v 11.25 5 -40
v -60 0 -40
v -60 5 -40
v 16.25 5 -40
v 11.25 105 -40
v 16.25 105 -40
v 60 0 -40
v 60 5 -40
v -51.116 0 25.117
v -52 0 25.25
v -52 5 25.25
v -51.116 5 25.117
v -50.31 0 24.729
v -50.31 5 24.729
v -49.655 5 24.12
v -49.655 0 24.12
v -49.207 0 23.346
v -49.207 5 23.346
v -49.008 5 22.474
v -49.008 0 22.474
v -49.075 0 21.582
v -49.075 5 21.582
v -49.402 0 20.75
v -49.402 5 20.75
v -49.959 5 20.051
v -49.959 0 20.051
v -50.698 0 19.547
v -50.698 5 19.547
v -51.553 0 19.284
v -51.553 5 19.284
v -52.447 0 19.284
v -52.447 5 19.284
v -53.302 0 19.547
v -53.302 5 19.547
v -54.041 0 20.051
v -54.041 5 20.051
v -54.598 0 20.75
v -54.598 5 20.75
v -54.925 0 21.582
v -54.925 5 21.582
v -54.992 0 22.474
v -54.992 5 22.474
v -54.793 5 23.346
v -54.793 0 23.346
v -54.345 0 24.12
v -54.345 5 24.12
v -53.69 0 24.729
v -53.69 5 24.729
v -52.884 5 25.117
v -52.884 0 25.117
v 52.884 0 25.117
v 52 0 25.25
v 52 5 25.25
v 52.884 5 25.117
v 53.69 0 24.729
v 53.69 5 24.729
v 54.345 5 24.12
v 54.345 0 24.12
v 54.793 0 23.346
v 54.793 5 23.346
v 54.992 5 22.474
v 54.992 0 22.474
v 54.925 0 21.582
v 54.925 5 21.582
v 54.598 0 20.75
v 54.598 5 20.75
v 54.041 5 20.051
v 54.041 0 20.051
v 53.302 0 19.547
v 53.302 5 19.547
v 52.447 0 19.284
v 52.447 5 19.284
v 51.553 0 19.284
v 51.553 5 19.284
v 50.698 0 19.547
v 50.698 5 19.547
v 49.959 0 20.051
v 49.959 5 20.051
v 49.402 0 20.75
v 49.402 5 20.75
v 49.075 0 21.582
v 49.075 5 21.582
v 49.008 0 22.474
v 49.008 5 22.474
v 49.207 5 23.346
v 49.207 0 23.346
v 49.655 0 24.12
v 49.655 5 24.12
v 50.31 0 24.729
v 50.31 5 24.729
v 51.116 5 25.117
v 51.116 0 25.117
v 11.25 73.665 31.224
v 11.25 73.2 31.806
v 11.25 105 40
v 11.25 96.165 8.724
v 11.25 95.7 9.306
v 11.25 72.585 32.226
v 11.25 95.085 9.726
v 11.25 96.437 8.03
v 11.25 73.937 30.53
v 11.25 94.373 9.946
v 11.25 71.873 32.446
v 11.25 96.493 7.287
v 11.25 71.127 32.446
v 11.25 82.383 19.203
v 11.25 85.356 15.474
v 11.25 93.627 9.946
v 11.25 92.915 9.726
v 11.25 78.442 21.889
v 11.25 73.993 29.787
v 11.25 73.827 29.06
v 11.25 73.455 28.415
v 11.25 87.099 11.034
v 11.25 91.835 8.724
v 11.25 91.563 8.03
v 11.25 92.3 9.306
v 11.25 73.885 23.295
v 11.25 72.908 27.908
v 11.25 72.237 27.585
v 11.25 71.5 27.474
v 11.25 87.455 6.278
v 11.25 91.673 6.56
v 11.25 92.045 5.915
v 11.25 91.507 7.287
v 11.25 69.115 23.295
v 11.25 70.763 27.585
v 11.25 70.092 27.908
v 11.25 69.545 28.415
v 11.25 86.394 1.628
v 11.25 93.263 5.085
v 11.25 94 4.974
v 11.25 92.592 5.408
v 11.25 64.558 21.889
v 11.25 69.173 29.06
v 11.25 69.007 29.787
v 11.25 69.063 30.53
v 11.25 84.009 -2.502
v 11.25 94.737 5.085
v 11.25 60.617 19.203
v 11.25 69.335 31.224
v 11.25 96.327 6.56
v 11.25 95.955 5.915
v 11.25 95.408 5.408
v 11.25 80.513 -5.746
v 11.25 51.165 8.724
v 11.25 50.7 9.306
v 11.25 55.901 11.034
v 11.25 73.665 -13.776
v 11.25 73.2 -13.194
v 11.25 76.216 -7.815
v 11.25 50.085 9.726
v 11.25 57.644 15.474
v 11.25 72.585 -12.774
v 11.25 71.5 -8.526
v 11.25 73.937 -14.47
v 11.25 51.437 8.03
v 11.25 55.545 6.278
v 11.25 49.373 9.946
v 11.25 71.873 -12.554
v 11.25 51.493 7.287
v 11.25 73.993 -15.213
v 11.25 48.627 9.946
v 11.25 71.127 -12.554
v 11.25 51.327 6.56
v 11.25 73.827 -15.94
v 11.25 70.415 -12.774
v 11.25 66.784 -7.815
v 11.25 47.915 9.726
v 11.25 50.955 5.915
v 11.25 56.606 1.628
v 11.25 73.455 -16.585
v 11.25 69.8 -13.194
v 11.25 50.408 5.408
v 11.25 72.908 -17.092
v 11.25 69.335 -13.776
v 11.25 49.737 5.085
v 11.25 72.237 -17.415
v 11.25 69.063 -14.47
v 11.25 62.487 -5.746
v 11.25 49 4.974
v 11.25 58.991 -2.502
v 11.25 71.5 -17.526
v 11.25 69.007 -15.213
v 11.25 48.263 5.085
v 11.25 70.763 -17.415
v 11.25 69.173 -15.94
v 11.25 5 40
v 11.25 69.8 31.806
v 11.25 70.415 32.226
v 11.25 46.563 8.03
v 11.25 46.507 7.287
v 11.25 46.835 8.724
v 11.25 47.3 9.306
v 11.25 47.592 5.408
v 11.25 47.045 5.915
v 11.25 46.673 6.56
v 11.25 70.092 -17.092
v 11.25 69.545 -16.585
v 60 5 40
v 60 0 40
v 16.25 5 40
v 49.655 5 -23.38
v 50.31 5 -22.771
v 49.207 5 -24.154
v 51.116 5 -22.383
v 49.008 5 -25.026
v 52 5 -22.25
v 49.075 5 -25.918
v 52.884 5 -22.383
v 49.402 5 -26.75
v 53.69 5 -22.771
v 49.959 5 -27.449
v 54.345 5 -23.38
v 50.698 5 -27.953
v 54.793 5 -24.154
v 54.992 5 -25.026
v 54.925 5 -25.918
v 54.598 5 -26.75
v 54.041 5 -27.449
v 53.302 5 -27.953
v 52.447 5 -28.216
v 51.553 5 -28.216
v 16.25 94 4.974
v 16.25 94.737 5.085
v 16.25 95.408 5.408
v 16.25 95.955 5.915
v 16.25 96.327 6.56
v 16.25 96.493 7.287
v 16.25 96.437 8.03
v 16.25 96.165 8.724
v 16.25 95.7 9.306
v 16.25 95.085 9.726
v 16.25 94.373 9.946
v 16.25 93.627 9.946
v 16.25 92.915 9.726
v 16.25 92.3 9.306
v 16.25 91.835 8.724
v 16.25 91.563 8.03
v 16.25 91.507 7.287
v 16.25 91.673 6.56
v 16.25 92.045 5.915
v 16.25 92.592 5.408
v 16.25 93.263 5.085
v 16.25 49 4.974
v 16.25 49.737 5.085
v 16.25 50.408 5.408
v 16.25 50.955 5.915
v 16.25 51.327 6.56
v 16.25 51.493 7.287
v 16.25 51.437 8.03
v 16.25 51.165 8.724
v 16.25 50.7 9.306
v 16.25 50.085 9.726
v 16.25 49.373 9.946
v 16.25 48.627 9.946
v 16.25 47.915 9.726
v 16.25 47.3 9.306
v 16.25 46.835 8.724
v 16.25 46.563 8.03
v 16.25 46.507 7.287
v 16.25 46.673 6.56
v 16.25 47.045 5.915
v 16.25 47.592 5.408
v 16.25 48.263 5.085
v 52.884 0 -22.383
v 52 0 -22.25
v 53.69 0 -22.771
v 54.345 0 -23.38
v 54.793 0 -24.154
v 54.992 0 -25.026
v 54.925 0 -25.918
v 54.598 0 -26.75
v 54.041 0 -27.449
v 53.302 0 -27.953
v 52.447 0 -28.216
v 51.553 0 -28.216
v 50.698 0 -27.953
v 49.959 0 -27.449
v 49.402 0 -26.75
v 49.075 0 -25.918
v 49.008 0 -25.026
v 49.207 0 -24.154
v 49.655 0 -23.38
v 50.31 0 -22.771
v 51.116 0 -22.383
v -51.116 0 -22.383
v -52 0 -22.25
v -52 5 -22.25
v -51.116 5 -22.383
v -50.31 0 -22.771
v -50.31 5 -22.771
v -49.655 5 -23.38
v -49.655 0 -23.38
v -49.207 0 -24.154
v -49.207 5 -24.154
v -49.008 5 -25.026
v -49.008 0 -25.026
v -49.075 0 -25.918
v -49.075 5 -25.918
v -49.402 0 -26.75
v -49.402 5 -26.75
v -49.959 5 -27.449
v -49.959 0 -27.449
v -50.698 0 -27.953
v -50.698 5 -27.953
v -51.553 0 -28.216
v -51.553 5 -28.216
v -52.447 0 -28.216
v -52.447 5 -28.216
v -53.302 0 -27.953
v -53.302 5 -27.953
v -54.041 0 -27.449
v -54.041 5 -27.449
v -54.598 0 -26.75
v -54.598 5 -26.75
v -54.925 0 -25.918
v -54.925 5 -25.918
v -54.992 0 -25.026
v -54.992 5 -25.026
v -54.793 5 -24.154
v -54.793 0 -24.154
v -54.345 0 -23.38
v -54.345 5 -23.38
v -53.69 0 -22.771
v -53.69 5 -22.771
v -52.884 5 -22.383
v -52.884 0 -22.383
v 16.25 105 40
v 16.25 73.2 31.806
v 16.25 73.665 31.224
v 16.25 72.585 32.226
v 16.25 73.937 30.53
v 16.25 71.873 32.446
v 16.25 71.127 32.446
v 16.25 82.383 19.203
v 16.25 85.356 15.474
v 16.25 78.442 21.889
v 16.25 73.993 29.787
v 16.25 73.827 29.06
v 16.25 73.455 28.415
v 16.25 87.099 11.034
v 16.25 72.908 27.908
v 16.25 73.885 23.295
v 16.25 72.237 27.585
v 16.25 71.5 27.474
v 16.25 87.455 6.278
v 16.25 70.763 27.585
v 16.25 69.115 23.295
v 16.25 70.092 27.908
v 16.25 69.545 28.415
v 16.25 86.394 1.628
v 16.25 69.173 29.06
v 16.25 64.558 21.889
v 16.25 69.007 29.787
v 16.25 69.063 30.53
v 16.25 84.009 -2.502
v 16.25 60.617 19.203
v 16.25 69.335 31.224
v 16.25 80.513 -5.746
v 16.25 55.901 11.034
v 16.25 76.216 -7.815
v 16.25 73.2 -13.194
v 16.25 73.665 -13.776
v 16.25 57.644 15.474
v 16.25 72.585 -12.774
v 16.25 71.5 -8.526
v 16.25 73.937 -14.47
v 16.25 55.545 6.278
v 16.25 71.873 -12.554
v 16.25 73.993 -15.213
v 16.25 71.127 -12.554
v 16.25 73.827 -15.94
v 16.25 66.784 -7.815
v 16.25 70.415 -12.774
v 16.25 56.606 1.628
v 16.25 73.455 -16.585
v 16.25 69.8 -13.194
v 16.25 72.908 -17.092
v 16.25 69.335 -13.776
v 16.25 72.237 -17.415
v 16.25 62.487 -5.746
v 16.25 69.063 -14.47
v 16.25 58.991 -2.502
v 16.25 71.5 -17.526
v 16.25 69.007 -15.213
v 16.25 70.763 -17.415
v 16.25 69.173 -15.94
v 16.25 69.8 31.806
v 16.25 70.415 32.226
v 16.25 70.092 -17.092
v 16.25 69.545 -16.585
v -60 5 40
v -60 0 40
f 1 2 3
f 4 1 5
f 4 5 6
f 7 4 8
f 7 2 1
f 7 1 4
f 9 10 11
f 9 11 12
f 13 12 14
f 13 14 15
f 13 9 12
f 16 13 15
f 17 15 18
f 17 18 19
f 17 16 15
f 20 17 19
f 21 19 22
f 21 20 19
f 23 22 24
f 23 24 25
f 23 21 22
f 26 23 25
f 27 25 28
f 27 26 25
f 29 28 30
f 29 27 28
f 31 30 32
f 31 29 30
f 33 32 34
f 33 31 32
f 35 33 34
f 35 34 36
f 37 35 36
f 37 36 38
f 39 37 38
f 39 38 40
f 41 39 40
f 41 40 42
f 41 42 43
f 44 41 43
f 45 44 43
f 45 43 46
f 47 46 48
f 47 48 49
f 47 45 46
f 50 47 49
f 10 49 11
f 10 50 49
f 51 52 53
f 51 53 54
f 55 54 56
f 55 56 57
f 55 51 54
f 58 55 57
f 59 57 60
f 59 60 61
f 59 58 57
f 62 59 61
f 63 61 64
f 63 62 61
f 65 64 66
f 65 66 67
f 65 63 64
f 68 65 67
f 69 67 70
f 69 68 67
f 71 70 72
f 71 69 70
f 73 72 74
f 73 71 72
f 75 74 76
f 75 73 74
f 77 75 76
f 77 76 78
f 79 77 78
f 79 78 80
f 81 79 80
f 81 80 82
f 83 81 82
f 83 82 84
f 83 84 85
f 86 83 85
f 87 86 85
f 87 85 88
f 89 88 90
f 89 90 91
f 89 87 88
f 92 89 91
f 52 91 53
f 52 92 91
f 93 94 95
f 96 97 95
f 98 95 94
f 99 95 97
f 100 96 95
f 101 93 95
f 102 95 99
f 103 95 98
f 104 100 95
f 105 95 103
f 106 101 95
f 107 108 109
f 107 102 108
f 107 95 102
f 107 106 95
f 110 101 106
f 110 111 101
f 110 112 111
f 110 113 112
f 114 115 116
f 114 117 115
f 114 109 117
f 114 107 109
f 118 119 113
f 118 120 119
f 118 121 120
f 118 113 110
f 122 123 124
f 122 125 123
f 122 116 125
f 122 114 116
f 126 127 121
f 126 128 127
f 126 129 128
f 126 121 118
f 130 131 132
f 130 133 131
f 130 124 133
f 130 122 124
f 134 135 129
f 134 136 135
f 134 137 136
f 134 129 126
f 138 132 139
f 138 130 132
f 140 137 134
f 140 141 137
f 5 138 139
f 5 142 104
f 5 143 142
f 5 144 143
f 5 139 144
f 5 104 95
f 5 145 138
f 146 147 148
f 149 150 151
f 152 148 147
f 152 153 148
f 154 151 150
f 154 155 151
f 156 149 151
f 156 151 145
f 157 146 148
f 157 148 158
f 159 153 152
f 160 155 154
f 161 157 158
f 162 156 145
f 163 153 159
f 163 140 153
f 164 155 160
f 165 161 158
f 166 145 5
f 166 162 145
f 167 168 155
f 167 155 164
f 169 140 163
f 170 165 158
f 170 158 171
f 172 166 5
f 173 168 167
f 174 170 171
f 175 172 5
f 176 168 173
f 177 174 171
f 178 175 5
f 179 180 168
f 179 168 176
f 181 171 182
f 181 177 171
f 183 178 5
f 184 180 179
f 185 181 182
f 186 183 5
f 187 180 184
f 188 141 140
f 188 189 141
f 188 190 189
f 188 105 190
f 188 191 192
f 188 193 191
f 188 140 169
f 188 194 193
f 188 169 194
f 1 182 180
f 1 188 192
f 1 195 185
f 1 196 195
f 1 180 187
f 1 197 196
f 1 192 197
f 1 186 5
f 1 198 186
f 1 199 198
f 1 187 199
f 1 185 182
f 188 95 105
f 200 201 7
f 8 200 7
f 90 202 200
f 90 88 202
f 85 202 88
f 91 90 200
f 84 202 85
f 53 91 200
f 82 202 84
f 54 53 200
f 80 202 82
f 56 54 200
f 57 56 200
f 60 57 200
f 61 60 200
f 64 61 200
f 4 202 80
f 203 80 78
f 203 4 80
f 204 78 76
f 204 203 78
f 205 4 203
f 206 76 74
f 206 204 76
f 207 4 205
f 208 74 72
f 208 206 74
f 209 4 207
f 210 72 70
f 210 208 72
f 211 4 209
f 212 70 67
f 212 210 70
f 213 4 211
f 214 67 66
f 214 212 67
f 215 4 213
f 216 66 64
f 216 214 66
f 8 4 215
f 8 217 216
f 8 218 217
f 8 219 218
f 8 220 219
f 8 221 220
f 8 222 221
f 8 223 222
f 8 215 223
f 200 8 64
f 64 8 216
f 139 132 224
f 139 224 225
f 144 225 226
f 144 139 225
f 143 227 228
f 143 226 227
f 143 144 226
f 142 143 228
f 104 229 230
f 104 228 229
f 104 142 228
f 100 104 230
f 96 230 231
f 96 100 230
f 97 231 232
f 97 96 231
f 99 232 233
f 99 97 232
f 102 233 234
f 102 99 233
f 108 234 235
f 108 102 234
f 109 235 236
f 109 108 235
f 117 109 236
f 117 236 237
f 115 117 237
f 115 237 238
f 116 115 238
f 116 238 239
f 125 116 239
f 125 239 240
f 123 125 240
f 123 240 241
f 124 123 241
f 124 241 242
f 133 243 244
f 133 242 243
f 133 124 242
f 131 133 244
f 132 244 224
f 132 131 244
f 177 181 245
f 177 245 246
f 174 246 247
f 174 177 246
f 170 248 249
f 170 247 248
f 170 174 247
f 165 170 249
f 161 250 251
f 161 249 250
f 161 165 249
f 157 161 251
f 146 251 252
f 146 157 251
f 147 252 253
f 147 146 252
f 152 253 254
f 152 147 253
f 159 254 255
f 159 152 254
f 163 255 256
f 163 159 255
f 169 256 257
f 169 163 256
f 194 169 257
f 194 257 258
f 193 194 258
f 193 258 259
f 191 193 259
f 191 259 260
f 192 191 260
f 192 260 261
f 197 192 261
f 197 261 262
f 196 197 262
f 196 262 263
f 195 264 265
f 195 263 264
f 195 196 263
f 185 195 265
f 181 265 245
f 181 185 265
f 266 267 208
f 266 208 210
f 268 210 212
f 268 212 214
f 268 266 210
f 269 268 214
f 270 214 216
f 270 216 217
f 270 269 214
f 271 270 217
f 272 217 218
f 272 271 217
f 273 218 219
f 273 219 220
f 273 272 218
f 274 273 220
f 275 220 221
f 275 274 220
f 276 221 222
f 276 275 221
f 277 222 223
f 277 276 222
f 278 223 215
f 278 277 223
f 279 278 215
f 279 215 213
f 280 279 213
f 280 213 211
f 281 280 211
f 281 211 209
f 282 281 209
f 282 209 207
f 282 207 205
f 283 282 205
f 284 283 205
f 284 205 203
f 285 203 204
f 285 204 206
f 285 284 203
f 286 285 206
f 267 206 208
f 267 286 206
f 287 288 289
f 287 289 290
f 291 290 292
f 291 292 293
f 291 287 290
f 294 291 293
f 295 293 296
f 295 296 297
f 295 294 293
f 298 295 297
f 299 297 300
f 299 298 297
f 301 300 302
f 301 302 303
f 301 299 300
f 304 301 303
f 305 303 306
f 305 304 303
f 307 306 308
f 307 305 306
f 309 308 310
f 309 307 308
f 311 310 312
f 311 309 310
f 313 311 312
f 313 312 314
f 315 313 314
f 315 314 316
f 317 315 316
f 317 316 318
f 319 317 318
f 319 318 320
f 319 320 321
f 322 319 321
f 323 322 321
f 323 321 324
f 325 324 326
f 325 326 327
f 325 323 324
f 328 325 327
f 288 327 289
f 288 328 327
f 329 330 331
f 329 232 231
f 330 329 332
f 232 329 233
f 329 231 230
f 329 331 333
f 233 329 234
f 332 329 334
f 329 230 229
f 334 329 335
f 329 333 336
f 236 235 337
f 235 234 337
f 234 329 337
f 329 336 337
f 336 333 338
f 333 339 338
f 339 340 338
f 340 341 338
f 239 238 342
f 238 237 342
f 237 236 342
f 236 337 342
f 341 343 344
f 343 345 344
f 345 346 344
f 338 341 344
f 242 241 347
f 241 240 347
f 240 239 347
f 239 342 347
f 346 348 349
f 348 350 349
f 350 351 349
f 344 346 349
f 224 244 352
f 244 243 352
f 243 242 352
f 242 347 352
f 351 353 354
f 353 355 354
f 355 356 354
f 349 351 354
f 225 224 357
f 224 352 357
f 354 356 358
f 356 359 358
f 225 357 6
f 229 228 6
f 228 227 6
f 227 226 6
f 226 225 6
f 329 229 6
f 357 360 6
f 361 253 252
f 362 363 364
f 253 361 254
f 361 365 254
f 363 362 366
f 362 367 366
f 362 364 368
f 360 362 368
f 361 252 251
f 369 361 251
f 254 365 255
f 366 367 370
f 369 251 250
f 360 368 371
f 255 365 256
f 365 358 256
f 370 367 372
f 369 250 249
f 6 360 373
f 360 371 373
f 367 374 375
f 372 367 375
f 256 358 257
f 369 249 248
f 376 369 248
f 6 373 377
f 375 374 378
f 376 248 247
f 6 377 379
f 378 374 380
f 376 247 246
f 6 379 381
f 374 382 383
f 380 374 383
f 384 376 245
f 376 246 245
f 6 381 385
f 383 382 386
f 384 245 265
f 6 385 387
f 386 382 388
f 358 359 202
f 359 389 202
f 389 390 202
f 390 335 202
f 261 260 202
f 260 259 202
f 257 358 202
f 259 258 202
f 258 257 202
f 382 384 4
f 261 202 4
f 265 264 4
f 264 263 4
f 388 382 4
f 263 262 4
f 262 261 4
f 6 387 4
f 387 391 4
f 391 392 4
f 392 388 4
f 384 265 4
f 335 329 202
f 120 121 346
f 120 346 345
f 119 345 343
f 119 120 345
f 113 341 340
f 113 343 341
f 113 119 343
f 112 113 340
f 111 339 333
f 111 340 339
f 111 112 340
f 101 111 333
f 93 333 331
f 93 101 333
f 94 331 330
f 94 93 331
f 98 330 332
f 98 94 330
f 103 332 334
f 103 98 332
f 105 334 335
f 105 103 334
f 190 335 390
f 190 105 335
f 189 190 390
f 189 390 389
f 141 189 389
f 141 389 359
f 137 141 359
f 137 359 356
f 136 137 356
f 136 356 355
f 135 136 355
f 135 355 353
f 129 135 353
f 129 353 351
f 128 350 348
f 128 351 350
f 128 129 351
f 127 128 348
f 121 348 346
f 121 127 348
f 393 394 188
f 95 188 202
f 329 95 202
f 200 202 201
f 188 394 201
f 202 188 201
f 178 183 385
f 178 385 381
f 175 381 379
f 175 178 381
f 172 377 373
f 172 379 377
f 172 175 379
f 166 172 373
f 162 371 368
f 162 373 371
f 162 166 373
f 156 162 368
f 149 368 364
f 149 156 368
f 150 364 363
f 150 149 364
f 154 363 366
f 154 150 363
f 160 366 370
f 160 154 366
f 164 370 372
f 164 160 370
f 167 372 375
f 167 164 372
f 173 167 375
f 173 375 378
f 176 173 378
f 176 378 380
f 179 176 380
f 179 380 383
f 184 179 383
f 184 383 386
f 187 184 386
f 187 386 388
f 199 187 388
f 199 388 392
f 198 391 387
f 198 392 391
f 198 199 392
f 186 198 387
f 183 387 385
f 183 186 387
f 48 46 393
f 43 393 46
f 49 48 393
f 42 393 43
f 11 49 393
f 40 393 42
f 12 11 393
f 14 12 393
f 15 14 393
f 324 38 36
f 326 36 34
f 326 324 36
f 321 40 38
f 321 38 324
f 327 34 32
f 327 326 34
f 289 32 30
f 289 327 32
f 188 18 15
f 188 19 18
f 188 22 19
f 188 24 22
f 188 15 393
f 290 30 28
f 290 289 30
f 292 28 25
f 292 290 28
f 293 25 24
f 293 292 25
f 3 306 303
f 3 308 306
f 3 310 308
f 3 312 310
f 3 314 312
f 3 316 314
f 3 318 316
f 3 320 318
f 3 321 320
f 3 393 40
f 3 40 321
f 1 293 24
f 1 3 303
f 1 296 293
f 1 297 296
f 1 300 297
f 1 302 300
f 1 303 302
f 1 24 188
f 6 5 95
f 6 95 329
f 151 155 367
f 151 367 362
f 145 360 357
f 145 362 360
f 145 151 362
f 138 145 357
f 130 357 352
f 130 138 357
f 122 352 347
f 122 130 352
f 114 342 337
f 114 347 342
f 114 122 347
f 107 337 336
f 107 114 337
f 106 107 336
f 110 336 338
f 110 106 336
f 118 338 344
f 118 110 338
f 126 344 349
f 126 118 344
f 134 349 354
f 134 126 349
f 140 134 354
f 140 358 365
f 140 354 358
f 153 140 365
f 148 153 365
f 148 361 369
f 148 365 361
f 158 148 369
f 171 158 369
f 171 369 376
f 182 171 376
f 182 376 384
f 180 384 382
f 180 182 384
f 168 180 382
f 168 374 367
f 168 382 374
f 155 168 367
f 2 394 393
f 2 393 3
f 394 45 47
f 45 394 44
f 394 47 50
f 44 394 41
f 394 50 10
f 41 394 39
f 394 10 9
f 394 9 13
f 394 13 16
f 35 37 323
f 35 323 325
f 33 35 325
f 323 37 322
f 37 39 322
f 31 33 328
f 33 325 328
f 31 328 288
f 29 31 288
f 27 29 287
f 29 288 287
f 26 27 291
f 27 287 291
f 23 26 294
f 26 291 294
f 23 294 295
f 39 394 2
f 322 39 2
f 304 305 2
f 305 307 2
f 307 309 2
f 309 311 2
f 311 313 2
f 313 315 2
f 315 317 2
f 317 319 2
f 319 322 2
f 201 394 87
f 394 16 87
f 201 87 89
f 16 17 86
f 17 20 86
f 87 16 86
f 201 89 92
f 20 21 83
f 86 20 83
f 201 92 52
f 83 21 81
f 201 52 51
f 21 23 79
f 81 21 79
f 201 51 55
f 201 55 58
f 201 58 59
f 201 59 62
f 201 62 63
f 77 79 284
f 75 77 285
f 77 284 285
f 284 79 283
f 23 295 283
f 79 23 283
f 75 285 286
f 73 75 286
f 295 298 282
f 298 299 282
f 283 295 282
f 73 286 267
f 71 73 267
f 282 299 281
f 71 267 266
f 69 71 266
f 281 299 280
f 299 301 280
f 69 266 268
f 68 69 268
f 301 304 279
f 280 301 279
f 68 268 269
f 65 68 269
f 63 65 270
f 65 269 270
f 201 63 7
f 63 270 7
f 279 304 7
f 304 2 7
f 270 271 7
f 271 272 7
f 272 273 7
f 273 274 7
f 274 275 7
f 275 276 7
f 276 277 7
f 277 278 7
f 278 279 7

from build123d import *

# Parameters (mm, degrees)
SKETCH1_W               = 120
SKETCH1_H               = 80
SKETCH1_R               = 3
BOSS_EXTRUDE1_DEPTH     = 5
SKETCH2_W               = 5
SKETCH2_H               = 80
BOSS_EXTRUDE2_DEPTH     = 100
CUT_EXTRUDE1_DEPTH      = 136.790509609
CUT_EXTRUDE1_DEPTH_BACK = 136.790509609
SKETCH3_R               = 16
SKETCH3_R_2             = 2.5


with BuildPart() as part:
    # Sketch1 → Boss-Extrude1 (new body)
    with BuildSketch(Plane(origin=(0, 0, 0), x_dir=(1, 0, 0), z_dir=(0, 1, 0))):
        Rectangle(SKETCH1_W, SKETCH1_H)
        with Locations(Location((-52, 25.25, 0), (0, 0, 270))):
            Circle(SKETCH1_R, mode=Mode.SUBTRACT)
        with Locations(Location((-52, -22.25, 0), (0, 0, 270))):
            Circle(SKETCH1_R, mode=Mode.SUBTRACT)
        with Locations(Location((52, -22.25, 0), (0, 0, 270))):
            Circle(SKETCH1_R, mode=Mode.SUBTRACT)
        with Locations(Location((52, 25.25, 0), (0, 0, 270))):
            Circle(SKETCH1_R, mode=Mode.SUBTRACT)
    extrude(amount=BOSS_EXTRUDE1_DEPTH)

    # Sketch2 → Boss-Extrude2 (add)
    with BuildSketch(Plane(origin=(0, 5, 0), x_dir=(1, 0, 0), z_dir=(0, 1, 0))):
        with Locations((13.75, 0)):
            Rectangle(SKETCH2_W, SKETCH2_H)
    extrude(amount=BOSS_EXTRUDE2_DEPTH)

    # Sketch3 → Cut-Extrude1 (cut, two sides: drawn at the far end of the back side and taken through both)
    with BuildSketch(Plane(origin=(16.25, 0, 0), x_dir=(0, 0, -1), z_dir=(1, 0, 0)).offset(-CUT_EXTRUDE1_DEPTH_BACK)):
        with Locations((-7.473800103, 71.5)):
            Circle(SKETCH3_R)
        with Locations((-29.973800103, 71.5)):
            Circle(SKETCH3_R_2)
        with Locations((15.026199897, 71.5)):
            Circle(SKETCH3_R_2)
        with Locations((-7.473800103, 49)):
            Circle(SKETCH3_R_2)
        with Locations((-7.473800103, 94)):
            Circle(SKETCH3_R_2)
    extrude(amount=CUT_EXTRUDE1_DEPTH + CUT_EXTRUDE1_DEPTH_BACK, mode=Mode.SUBTRACT)


solid = part.part
